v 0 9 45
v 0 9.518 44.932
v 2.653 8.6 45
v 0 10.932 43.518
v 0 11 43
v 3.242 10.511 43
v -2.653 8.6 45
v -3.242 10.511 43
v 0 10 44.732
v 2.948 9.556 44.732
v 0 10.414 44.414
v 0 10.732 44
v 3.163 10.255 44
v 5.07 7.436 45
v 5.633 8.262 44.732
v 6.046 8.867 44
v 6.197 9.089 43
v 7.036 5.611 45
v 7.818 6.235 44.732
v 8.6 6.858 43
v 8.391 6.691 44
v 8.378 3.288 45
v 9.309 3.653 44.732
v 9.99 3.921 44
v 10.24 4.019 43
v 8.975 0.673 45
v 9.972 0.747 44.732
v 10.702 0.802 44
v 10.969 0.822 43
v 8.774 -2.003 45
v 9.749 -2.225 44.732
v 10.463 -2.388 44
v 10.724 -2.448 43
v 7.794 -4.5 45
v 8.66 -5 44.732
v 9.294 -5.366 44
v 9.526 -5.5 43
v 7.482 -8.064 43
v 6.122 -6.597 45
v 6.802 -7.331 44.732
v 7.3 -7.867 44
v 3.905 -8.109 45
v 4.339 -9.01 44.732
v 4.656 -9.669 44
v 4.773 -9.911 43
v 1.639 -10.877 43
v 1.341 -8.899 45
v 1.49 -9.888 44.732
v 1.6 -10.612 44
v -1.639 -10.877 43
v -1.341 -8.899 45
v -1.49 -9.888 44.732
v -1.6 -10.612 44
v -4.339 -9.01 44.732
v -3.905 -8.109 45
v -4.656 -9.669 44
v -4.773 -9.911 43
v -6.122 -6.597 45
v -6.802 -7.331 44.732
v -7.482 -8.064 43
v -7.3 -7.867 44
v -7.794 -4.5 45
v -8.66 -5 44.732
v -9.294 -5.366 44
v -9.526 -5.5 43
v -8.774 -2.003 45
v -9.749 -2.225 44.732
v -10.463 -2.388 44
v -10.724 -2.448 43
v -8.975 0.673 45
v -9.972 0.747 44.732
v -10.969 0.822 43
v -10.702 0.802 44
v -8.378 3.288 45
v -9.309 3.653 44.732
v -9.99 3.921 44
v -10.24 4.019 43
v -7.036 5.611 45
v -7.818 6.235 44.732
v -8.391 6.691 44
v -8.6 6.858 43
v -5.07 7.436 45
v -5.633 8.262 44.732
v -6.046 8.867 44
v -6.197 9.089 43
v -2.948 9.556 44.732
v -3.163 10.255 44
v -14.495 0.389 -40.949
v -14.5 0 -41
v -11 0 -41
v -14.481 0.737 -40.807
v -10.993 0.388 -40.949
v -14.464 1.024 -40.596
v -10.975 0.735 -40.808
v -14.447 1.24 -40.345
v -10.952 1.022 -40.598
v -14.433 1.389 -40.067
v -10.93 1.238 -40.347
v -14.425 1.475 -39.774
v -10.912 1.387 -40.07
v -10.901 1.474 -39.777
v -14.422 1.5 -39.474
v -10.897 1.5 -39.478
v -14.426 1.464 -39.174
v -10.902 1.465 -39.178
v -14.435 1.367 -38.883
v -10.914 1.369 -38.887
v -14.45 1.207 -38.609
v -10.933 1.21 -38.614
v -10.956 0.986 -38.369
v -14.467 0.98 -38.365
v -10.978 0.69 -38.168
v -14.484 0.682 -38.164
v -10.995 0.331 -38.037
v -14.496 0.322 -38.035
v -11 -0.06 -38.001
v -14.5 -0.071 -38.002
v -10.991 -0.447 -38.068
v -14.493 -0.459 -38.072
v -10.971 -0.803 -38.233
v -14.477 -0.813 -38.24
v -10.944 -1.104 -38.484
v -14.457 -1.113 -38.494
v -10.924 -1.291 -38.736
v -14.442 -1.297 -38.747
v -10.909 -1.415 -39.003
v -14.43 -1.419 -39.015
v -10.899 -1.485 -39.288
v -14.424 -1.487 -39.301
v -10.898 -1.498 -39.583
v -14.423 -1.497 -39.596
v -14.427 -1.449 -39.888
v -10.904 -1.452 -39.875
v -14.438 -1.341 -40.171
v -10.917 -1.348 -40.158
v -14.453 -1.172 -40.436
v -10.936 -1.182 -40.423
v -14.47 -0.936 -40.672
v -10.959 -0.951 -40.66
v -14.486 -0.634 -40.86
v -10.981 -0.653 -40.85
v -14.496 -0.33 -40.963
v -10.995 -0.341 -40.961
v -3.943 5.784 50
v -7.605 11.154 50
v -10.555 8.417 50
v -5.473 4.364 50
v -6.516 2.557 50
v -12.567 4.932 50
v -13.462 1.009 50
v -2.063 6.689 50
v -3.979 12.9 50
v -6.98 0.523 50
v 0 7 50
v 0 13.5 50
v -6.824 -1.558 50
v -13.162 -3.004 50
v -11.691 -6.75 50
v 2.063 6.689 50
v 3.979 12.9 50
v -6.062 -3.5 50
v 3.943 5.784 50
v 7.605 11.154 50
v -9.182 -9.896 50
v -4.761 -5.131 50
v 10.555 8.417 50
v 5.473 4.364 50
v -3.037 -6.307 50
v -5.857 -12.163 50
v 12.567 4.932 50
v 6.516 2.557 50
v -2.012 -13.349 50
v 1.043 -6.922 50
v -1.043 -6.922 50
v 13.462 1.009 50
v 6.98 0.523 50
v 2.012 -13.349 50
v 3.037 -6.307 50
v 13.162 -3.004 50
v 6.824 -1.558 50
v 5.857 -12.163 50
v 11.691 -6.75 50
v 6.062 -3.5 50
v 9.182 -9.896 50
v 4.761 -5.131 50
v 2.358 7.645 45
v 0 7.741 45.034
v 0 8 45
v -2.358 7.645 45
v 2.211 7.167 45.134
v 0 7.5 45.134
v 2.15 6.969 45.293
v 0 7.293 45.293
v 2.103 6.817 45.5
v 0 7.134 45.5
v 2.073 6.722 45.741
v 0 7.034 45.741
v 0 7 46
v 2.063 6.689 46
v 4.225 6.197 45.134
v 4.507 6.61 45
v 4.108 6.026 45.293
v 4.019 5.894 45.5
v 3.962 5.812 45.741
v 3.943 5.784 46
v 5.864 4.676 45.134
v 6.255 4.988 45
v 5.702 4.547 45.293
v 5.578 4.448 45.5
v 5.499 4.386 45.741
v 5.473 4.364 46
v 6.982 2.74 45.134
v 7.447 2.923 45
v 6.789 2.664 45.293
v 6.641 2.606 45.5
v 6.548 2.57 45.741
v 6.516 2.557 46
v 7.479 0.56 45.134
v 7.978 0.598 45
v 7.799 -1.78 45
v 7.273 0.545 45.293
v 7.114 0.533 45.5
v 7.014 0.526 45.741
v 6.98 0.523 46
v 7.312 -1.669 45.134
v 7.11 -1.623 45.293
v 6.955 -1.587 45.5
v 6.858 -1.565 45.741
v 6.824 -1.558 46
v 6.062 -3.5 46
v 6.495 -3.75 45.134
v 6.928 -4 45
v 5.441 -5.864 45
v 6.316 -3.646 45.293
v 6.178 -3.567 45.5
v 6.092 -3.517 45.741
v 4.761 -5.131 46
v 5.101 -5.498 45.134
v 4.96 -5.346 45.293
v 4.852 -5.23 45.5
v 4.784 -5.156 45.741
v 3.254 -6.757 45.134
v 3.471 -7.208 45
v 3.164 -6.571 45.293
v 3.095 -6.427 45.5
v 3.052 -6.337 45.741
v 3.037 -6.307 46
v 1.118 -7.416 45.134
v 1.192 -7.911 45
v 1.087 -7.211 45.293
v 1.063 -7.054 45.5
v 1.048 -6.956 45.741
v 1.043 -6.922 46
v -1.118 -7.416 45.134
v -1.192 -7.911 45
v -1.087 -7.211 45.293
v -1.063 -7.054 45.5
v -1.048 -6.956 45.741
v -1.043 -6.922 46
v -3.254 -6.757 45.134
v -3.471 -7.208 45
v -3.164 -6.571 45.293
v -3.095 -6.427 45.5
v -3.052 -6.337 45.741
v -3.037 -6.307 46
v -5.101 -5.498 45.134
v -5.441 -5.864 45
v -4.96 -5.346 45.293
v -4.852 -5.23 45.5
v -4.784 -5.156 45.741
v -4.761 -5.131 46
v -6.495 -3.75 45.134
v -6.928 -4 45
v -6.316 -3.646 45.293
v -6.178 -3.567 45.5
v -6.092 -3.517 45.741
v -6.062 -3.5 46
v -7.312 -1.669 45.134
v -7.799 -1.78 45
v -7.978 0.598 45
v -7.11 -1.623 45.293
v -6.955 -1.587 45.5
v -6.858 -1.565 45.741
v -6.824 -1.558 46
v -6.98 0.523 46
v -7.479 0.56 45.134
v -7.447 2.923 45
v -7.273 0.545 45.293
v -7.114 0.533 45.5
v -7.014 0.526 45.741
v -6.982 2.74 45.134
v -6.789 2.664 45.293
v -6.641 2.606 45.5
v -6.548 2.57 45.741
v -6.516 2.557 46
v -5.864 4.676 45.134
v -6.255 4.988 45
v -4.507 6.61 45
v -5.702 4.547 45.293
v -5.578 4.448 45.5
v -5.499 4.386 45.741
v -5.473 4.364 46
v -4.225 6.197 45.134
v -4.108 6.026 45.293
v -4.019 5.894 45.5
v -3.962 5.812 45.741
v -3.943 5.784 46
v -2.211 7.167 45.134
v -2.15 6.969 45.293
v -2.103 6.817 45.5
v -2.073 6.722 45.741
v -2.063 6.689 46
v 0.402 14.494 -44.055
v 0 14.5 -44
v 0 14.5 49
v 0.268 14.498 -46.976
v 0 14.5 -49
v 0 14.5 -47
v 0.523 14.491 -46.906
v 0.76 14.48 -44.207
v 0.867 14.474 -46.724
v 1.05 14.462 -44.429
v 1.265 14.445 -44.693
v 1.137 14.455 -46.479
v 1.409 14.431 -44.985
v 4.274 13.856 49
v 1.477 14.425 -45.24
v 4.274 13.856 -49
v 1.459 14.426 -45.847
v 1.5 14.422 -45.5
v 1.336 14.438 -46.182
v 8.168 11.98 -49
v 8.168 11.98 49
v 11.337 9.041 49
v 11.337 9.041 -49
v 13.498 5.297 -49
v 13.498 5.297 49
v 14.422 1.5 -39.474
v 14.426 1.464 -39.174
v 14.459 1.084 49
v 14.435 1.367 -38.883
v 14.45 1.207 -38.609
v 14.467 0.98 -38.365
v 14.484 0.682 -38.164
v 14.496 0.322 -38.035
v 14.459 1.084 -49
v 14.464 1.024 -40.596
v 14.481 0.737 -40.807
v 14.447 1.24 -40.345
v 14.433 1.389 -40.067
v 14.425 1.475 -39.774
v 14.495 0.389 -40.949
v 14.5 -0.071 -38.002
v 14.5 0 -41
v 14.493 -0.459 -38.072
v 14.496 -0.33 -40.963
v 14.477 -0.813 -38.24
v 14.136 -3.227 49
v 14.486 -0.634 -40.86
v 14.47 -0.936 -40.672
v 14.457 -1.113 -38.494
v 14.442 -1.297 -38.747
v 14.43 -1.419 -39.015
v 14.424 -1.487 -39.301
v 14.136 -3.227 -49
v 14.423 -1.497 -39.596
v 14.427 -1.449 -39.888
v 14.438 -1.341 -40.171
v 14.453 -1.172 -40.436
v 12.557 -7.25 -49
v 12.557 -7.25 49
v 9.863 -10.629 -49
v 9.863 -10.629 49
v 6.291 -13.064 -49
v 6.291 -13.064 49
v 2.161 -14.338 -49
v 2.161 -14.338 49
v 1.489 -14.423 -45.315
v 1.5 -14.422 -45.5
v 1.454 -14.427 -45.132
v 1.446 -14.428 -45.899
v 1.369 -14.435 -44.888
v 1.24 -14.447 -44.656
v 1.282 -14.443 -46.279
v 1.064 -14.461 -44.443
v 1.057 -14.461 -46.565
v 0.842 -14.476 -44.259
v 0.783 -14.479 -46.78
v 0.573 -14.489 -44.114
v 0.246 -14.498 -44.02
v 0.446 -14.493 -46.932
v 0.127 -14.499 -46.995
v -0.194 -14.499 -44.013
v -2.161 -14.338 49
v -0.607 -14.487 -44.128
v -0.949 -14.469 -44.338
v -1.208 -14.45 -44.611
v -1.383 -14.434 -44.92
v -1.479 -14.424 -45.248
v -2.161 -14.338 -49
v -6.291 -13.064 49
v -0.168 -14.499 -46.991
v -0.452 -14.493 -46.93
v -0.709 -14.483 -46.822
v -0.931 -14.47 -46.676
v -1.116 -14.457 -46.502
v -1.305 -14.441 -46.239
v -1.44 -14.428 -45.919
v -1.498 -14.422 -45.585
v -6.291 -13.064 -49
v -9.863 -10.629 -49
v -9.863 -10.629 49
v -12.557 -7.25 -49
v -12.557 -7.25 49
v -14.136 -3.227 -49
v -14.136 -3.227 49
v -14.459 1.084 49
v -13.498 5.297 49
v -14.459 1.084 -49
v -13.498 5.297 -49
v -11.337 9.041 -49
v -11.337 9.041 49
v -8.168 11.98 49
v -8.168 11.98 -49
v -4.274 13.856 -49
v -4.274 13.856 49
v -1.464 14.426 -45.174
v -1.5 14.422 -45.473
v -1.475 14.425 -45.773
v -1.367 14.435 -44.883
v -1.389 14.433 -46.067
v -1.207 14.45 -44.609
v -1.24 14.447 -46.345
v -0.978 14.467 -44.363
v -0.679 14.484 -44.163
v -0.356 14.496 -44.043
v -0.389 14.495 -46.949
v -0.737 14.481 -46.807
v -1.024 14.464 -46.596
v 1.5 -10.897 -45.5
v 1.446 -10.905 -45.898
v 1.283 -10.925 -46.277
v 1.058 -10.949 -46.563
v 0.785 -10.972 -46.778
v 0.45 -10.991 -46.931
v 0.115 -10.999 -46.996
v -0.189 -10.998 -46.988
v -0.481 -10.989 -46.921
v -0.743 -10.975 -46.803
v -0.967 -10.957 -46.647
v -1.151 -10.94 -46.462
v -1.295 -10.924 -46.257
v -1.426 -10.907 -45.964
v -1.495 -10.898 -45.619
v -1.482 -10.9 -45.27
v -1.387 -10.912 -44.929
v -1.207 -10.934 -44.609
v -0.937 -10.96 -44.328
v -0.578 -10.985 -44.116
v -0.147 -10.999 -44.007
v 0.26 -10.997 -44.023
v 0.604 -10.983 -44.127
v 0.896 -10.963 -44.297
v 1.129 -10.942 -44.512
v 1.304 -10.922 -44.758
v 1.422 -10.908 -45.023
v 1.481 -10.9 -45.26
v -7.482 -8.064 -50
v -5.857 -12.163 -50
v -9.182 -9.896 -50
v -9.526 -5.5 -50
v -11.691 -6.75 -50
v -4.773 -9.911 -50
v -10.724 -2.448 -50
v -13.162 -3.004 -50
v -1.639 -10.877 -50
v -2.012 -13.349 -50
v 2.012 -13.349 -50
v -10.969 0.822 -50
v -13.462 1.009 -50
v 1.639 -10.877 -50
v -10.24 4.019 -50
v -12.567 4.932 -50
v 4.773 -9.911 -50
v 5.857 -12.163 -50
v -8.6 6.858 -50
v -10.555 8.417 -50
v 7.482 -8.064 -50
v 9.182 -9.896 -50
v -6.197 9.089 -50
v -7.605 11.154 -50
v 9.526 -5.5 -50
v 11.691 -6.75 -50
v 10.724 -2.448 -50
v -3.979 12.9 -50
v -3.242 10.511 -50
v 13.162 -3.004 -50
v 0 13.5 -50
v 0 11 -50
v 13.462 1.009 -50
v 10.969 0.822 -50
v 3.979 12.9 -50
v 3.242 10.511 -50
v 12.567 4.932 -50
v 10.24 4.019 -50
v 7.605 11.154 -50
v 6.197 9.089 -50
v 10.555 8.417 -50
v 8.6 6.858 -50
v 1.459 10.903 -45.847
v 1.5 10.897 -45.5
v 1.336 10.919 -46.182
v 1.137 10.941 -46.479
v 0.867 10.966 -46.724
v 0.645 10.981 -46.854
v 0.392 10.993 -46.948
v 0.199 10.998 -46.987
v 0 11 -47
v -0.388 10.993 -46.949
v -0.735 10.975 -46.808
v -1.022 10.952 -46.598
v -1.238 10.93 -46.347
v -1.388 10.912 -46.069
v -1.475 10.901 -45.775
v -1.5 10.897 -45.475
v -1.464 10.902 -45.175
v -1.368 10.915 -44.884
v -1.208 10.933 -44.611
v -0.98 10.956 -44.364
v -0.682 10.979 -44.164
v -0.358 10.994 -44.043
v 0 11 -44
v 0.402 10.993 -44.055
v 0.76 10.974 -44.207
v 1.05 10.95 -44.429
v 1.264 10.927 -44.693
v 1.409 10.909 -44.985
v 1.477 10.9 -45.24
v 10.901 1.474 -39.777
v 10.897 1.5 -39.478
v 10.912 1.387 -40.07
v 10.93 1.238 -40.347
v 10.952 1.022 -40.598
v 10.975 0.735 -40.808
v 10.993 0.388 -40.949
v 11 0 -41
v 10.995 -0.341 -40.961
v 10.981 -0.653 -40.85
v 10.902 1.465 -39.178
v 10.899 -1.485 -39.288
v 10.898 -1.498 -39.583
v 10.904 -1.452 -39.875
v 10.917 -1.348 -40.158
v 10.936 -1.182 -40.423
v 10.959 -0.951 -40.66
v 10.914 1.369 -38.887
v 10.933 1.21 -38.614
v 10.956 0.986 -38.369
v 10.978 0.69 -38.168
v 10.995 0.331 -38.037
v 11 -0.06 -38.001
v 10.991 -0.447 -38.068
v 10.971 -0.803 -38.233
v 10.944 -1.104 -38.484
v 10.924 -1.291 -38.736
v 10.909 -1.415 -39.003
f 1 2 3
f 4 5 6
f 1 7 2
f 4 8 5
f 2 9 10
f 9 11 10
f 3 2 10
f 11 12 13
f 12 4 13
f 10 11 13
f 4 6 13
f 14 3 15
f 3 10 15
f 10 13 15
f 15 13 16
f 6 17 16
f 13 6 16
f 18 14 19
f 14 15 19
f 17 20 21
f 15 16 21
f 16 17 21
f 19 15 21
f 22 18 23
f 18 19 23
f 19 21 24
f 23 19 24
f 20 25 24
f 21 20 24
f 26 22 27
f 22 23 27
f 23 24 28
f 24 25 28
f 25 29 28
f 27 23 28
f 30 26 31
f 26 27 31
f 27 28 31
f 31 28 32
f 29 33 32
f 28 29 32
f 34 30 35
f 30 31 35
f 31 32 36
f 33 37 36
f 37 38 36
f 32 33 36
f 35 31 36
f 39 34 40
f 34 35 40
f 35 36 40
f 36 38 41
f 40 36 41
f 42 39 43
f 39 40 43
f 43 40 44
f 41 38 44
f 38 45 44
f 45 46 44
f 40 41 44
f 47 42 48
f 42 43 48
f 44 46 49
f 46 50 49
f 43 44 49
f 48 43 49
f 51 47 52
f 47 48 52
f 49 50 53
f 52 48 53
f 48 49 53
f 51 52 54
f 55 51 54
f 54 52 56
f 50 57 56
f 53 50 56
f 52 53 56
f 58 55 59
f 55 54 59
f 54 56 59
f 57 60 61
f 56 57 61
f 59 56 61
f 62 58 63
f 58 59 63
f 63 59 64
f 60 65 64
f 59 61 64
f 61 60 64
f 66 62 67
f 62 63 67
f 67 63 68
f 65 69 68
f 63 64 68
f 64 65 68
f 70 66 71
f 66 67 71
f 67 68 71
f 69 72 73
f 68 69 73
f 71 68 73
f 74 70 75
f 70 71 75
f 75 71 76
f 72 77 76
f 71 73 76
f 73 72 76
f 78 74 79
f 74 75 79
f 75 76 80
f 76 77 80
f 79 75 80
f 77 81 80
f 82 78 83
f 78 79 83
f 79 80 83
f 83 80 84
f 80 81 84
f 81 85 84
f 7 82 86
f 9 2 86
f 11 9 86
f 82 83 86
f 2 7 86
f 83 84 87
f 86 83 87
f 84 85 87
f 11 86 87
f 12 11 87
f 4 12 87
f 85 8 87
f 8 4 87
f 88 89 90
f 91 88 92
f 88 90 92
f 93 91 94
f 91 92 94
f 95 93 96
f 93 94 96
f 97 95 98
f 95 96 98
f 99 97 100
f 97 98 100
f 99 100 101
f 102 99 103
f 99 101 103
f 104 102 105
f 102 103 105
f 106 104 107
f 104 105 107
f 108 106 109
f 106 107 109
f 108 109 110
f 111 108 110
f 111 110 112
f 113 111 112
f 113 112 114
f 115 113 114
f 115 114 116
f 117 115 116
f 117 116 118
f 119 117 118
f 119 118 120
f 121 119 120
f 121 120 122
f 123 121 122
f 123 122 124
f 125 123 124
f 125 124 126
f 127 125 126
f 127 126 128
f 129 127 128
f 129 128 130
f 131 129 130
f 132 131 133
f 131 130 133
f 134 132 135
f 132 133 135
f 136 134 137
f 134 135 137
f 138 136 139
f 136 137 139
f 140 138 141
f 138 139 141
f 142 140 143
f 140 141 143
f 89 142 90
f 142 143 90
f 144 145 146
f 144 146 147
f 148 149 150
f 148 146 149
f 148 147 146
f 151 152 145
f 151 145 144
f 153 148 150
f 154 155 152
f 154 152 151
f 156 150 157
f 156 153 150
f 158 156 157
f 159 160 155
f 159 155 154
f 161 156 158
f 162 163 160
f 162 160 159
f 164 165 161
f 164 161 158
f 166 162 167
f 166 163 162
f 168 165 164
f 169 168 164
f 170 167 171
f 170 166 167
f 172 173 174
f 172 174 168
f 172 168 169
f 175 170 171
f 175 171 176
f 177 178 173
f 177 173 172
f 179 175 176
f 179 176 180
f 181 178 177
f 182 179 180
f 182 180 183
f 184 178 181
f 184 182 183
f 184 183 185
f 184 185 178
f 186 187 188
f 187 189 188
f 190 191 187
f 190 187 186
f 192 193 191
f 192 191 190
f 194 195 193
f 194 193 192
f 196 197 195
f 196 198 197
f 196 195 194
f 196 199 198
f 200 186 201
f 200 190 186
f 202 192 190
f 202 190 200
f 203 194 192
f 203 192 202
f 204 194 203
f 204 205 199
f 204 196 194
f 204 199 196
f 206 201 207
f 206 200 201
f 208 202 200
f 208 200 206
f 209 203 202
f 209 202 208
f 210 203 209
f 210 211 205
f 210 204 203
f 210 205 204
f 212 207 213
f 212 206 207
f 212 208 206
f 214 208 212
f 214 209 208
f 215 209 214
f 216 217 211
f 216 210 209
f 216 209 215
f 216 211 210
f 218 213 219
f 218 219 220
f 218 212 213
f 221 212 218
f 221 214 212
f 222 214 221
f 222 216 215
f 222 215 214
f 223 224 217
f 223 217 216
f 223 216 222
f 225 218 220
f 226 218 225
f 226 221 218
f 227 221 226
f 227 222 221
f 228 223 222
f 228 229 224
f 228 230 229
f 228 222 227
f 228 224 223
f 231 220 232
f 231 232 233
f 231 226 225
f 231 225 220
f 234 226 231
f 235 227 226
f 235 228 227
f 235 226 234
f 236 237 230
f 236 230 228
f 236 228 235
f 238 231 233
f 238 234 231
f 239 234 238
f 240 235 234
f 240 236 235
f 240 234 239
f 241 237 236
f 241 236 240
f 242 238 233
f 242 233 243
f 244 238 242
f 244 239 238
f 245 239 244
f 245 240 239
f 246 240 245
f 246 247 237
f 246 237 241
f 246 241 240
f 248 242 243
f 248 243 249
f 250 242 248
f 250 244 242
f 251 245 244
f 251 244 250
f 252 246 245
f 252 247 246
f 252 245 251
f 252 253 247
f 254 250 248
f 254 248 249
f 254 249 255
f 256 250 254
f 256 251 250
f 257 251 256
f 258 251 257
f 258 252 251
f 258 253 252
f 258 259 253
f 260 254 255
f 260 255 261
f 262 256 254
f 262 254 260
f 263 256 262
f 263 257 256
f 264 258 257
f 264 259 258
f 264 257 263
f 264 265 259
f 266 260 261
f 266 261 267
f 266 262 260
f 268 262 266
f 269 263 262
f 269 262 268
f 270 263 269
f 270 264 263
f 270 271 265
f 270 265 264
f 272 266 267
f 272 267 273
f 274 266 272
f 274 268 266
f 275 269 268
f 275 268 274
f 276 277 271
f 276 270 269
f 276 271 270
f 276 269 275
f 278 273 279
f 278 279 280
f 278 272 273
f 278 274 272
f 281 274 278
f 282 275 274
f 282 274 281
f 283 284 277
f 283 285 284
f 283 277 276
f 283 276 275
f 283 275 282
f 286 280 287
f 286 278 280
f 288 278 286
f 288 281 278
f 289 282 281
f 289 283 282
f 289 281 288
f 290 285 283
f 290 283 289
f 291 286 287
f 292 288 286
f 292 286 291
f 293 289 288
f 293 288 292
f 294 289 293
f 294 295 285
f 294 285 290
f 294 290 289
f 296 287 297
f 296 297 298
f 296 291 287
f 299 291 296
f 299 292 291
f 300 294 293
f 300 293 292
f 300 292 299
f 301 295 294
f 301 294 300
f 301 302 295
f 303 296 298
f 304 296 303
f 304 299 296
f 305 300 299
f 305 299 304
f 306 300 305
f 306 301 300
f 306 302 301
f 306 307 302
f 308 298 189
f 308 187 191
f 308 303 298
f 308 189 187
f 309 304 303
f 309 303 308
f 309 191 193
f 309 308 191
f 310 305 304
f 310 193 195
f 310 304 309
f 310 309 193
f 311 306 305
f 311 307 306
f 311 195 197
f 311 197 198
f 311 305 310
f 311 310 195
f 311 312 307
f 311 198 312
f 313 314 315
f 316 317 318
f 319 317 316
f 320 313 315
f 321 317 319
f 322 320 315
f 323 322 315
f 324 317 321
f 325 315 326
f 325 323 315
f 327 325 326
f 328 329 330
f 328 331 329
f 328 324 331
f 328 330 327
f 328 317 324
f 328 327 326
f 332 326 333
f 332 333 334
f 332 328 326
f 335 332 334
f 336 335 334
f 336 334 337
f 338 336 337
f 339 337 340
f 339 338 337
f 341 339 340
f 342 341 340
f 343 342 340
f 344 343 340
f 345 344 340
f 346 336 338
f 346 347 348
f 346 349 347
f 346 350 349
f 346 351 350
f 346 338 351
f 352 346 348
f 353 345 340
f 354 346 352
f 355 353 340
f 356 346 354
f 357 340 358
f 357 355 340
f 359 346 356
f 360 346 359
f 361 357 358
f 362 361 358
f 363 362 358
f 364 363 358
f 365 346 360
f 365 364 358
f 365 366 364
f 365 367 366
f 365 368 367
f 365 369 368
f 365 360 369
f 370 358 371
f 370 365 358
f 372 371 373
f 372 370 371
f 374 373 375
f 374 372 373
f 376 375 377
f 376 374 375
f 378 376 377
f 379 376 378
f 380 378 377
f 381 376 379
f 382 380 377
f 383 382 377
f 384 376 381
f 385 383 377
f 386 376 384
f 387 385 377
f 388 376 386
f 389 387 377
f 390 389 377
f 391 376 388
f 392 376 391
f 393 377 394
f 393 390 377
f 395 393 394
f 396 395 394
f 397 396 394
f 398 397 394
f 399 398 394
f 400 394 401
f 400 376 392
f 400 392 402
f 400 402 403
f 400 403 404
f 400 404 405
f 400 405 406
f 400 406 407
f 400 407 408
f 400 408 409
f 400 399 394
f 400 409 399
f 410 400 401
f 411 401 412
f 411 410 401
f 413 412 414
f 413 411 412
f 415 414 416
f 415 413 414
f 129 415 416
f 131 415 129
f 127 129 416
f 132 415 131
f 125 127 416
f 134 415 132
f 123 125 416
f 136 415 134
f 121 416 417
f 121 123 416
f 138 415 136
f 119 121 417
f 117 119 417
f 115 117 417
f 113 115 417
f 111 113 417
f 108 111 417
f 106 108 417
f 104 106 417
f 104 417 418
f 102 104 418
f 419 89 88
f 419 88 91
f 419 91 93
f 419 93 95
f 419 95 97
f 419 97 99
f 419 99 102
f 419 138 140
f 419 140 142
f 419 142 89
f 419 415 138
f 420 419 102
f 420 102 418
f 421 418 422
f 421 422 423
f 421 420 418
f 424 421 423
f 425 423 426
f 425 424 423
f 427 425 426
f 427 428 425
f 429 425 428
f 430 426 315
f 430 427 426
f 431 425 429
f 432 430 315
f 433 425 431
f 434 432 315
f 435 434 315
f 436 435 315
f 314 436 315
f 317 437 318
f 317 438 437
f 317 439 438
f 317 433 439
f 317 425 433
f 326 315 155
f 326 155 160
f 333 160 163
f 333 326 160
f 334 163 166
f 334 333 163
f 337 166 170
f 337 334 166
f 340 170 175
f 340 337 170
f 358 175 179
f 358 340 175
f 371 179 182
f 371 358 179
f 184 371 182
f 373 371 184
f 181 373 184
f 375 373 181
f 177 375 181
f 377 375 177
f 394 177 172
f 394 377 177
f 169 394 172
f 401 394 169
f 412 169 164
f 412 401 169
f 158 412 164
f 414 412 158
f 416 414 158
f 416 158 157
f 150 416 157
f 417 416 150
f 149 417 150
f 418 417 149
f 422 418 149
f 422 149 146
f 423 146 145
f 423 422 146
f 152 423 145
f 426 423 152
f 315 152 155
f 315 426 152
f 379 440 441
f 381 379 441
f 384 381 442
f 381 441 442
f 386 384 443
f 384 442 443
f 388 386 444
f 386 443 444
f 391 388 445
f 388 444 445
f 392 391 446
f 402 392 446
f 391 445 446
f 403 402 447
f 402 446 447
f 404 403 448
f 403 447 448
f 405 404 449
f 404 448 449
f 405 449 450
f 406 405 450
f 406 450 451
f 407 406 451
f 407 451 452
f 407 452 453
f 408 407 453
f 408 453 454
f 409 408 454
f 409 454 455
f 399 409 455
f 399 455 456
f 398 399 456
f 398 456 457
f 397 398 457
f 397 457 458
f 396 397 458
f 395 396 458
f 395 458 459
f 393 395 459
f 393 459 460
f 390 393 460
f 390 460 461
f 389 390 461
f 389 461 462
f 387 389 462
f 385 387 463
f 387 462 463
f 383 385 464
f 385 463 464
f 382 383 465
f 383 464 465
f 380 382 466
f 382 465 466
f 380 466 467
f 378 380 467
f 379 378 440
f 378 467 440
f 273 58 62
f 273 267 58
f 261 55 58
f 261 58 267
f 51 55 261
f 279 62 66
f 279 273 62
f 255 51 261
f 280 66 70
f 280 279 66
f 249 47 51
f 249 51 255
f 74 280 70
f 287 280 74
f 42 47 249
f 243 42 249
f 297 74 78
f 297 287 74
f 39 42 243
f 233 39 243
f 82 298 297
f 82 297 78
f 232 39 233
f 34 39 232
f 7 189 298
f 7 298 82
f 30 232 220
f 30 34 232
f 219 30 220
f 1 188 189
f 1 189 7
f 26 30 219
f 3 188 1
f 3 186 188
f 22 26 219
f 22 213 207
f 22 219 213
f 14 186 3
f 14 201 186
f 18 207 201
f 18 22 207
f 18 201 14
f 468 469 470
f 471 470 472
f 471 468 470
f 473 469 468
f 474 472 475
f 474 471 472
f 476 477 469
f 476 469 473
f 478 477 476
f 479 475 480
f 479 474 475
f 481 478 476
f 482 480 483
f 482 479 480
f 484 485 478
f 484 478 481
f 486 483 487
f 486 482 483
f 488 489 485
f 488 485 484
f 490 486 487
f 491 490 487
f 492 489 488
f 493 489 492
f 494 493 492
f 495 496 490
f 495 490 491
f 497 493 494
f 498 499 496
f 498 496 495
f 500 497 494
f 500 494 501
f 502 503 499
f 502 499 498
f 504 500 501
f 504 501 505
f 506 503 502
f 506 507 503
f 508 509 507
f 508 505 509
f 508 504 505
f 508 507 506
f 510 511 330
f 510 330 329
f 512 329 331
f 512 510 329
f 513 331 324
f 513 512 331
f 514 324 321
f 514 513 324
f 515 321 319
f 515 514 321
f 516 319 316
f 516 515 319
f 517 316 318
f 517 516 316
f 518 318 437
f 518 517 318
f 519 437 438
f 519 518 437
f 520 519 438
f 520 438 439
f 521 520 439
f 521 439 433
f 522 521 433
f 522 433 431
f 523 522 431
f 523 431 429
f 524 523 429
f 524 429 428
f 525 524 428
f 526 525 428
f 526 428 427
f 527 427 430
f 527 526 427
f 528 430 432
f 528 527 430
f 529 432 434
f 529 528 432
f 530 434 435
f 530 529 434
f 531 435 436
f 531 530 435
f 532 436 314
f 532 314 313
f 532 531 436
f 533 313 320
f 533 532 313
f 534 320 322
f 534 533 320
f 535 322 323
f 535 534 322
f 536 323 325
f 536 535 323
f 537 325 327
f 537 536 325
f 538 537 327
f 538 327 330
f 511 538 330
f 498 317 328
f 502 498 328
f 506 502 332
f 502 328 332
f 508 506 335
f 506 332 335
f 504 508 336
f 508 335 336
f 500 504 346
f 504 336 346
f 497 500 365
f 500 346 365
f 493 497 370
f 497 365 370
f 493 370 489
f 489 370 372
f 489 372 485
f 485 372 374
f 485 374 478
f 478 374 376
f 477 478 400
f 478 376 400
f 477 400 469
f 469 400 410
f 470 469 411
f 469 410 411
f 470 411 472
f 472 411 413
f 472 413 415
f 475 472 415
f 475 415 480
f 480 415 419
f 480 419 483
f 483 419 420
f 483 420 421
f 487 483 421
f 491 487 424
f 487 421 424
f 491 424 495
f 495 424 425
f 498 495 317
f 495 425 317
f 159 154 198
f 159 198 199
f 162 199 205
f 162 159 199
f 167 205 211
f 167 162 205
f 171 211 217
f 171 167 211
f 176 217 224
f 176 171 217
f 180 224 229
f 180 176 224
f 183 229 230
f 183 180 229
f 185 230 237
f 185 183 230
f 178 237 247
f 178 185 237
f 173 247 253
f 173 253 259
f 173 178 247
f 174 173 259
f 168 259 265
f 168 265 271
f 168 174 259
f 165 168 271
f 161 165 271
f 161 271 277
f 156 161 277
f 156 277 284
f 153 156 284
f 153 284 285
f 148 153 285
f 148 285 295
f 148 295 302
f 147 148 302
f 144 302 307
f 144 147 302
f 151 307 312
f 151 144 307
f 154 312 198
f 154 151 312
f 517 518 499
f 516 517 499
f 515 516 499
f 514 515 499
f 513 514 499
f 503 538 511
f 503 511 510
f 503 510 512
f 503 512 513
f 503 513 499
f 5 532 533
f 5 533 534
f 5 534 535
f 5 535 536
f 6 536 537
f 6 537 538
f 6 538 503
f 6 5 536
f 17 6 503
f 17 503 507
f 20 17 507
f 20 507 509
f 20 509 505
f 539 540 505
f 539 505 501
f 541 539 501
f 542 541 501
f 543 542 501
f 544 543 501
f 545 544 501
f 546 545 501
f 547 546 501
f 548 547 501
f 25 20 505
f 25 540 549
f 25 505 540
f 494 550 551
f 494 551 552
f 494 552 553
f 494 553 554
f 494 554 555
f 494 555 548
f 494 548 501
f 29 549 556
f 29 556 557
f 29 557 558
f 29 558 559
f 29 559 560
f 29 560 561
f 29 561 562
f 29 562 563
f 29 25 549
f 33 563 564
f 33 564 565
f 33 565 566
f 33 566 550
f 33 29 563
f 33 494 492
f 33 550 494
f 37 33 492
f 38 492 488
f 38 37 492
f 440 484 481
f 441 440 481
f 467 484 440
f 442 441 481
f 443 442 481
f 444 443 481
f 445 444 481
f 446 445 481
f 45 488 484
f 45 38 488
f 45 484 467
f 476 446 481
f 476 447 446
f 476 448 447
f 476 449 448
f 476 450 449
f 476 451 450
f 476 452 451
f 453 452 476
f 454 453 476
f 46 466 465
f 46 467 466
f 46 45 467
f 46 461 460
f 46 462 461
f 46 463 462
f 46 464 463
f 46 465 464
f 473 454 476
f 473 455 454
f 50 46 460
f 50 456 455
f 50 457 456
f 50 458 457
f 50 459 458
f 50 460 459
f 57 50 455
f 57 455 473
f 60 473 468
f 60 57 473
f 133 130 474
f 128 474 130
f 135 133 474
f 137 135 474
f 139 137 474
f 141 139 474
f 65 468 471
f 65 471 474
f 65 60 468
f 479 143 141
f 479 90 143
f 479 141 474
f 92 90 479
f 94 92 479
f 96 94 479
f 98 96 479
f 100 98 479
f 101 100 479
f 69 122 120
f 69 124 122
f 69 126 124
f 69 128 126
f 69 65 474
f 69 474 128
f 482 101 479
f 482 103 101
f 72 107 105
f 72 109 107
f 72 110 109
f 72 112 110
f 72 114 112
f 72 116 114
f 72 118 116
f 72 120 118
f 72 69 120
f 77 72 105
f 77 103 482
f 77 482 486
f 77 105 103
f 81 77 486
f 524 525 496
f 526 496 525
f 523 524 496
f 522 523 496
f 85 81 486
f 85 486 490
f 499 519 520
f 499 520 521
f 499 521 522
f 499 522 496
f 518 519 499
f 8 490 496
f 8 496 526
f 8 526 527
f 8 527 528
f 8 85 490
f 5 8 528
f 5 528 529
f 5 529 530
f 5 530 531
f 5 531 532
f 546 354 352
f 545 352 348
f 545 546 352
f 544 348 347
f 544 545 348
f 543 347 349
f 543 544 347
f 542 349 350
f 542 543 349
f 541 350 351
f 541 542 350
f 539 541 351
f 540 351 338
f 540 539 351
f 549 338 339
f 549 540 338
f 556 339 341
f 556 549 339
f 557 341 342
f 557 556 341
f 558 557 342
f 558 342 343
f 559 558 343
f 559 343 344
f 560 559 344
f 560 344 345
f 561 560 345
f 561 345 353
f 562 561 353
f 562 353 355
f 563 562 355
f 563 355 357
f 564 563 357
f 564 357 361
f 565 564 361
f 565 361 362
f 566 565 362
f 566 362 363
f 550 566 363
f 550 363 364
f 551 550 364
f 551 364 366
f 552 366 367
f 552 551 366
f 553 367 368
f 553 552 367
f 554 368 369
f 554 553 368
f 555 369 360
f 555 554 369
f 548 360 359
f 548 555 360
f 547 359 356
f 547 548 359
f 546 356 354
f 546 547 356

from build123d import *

# Parameters (mm, degrees)
ESQUISSE2_R                  = 1.5
ENL_V_MAT_EXTRU_1_DEPTH      = 15.5
ENL_V_MAT_EXTRU_1_DEPTH_BACK = 15.5
ESQUISSE3_R                  = 1.5
ENL_V_MAT_EXTRU_2_DEPTH      = 15.5000001
ENL_V_MAT_EXTRU_2_DEPTH_BACK = 15.5000001
CONG_1_R                     = 2
CONG_2_R                     = 1
CHANFREIN1_SIZE              = 1


with BuildPart() as part:
    # Esquisse1 → Révolution1 (revolve)
    with BuildSketch(Plane(origin=(0, 0, 0), x_dir=(0, 0, -1), z_dir=(1, 0, 0))):
        Polygon((-45, 11), (-45, 7), (-50, 7), (-50, 14.5), (50, 14.5), (50, 11), align=None)
    revolve(axis=Axis((0, 0, 50), (0, 0, -1)))

    # Esquisse2 → Enlèv. mat.-Extru.1 (cut, two sides)
    with BuildSketch(Plane(origin=(0, 0, 0), x_dir=(0, 0, -1), z_dir=(1, 0, 0))) as enl_v_mat_extru_1_sk:
        with Locations((39.5, 0)):
            Circle(ESQUISSE2_R)
    extrude(amount=ENL_V_MAT_EXTRU_1_DEPTH, mode=Mode.SUBTRACT)
    extrude(enl_v_mat_extru_1_sk.sketch, amount=-ENL_V_MAT_EXTRU_1_DEPTH_BACK, mode=Mode.SUBTRACT)

    # Esquisse3 → Enlèv. mat.-Extru.2 (cut, two sides)
    with BuildSketch(Plane(origin=(0, 0, 0), x_dir=(1, 0, 0), z_dir=(0, 1, 0))) as enl_v_mat_extru_2_sk:
        with Locations((0, 45.5)):
            Circle(ESQUISSE3_R)
    extrude(amount=ENL_V_MAT_EXTRU_2_DEPTH, mode=Mode.SUBTRACT)
    extrude(enl_v_mat_extru_2_sk.sketch, amount=-ENL_V_MAT_EXTRU_2_DEPTH_BACK, mode=Mode.SUBTRACT)

    # Congé1
    cong_1_edges = [part.edges().sort_by_distance(p)[0] for p in [
        (0, -11, 45),
    ]]
    fillet(cong_1_edges, radius=CONG_1_R)

    # Congé2
    cong_2_edges = [part.edges().sort_by_distance(p)[0] for p in [
        (0, -7, 45),
    ]]
    fillet(cong_2_edges, radius=CONG_2_R)

    # Chanfrein1
    chanfrein1_edges = [part.edges().sort_by_distance(p)[0] for p in [
        (0, -14.5, 50),
        (0, -14.5, -50),
    ]]
    chamfer(chanfrein1_edges, length=CHANFREIN1_SIZE)


solid = part.part
